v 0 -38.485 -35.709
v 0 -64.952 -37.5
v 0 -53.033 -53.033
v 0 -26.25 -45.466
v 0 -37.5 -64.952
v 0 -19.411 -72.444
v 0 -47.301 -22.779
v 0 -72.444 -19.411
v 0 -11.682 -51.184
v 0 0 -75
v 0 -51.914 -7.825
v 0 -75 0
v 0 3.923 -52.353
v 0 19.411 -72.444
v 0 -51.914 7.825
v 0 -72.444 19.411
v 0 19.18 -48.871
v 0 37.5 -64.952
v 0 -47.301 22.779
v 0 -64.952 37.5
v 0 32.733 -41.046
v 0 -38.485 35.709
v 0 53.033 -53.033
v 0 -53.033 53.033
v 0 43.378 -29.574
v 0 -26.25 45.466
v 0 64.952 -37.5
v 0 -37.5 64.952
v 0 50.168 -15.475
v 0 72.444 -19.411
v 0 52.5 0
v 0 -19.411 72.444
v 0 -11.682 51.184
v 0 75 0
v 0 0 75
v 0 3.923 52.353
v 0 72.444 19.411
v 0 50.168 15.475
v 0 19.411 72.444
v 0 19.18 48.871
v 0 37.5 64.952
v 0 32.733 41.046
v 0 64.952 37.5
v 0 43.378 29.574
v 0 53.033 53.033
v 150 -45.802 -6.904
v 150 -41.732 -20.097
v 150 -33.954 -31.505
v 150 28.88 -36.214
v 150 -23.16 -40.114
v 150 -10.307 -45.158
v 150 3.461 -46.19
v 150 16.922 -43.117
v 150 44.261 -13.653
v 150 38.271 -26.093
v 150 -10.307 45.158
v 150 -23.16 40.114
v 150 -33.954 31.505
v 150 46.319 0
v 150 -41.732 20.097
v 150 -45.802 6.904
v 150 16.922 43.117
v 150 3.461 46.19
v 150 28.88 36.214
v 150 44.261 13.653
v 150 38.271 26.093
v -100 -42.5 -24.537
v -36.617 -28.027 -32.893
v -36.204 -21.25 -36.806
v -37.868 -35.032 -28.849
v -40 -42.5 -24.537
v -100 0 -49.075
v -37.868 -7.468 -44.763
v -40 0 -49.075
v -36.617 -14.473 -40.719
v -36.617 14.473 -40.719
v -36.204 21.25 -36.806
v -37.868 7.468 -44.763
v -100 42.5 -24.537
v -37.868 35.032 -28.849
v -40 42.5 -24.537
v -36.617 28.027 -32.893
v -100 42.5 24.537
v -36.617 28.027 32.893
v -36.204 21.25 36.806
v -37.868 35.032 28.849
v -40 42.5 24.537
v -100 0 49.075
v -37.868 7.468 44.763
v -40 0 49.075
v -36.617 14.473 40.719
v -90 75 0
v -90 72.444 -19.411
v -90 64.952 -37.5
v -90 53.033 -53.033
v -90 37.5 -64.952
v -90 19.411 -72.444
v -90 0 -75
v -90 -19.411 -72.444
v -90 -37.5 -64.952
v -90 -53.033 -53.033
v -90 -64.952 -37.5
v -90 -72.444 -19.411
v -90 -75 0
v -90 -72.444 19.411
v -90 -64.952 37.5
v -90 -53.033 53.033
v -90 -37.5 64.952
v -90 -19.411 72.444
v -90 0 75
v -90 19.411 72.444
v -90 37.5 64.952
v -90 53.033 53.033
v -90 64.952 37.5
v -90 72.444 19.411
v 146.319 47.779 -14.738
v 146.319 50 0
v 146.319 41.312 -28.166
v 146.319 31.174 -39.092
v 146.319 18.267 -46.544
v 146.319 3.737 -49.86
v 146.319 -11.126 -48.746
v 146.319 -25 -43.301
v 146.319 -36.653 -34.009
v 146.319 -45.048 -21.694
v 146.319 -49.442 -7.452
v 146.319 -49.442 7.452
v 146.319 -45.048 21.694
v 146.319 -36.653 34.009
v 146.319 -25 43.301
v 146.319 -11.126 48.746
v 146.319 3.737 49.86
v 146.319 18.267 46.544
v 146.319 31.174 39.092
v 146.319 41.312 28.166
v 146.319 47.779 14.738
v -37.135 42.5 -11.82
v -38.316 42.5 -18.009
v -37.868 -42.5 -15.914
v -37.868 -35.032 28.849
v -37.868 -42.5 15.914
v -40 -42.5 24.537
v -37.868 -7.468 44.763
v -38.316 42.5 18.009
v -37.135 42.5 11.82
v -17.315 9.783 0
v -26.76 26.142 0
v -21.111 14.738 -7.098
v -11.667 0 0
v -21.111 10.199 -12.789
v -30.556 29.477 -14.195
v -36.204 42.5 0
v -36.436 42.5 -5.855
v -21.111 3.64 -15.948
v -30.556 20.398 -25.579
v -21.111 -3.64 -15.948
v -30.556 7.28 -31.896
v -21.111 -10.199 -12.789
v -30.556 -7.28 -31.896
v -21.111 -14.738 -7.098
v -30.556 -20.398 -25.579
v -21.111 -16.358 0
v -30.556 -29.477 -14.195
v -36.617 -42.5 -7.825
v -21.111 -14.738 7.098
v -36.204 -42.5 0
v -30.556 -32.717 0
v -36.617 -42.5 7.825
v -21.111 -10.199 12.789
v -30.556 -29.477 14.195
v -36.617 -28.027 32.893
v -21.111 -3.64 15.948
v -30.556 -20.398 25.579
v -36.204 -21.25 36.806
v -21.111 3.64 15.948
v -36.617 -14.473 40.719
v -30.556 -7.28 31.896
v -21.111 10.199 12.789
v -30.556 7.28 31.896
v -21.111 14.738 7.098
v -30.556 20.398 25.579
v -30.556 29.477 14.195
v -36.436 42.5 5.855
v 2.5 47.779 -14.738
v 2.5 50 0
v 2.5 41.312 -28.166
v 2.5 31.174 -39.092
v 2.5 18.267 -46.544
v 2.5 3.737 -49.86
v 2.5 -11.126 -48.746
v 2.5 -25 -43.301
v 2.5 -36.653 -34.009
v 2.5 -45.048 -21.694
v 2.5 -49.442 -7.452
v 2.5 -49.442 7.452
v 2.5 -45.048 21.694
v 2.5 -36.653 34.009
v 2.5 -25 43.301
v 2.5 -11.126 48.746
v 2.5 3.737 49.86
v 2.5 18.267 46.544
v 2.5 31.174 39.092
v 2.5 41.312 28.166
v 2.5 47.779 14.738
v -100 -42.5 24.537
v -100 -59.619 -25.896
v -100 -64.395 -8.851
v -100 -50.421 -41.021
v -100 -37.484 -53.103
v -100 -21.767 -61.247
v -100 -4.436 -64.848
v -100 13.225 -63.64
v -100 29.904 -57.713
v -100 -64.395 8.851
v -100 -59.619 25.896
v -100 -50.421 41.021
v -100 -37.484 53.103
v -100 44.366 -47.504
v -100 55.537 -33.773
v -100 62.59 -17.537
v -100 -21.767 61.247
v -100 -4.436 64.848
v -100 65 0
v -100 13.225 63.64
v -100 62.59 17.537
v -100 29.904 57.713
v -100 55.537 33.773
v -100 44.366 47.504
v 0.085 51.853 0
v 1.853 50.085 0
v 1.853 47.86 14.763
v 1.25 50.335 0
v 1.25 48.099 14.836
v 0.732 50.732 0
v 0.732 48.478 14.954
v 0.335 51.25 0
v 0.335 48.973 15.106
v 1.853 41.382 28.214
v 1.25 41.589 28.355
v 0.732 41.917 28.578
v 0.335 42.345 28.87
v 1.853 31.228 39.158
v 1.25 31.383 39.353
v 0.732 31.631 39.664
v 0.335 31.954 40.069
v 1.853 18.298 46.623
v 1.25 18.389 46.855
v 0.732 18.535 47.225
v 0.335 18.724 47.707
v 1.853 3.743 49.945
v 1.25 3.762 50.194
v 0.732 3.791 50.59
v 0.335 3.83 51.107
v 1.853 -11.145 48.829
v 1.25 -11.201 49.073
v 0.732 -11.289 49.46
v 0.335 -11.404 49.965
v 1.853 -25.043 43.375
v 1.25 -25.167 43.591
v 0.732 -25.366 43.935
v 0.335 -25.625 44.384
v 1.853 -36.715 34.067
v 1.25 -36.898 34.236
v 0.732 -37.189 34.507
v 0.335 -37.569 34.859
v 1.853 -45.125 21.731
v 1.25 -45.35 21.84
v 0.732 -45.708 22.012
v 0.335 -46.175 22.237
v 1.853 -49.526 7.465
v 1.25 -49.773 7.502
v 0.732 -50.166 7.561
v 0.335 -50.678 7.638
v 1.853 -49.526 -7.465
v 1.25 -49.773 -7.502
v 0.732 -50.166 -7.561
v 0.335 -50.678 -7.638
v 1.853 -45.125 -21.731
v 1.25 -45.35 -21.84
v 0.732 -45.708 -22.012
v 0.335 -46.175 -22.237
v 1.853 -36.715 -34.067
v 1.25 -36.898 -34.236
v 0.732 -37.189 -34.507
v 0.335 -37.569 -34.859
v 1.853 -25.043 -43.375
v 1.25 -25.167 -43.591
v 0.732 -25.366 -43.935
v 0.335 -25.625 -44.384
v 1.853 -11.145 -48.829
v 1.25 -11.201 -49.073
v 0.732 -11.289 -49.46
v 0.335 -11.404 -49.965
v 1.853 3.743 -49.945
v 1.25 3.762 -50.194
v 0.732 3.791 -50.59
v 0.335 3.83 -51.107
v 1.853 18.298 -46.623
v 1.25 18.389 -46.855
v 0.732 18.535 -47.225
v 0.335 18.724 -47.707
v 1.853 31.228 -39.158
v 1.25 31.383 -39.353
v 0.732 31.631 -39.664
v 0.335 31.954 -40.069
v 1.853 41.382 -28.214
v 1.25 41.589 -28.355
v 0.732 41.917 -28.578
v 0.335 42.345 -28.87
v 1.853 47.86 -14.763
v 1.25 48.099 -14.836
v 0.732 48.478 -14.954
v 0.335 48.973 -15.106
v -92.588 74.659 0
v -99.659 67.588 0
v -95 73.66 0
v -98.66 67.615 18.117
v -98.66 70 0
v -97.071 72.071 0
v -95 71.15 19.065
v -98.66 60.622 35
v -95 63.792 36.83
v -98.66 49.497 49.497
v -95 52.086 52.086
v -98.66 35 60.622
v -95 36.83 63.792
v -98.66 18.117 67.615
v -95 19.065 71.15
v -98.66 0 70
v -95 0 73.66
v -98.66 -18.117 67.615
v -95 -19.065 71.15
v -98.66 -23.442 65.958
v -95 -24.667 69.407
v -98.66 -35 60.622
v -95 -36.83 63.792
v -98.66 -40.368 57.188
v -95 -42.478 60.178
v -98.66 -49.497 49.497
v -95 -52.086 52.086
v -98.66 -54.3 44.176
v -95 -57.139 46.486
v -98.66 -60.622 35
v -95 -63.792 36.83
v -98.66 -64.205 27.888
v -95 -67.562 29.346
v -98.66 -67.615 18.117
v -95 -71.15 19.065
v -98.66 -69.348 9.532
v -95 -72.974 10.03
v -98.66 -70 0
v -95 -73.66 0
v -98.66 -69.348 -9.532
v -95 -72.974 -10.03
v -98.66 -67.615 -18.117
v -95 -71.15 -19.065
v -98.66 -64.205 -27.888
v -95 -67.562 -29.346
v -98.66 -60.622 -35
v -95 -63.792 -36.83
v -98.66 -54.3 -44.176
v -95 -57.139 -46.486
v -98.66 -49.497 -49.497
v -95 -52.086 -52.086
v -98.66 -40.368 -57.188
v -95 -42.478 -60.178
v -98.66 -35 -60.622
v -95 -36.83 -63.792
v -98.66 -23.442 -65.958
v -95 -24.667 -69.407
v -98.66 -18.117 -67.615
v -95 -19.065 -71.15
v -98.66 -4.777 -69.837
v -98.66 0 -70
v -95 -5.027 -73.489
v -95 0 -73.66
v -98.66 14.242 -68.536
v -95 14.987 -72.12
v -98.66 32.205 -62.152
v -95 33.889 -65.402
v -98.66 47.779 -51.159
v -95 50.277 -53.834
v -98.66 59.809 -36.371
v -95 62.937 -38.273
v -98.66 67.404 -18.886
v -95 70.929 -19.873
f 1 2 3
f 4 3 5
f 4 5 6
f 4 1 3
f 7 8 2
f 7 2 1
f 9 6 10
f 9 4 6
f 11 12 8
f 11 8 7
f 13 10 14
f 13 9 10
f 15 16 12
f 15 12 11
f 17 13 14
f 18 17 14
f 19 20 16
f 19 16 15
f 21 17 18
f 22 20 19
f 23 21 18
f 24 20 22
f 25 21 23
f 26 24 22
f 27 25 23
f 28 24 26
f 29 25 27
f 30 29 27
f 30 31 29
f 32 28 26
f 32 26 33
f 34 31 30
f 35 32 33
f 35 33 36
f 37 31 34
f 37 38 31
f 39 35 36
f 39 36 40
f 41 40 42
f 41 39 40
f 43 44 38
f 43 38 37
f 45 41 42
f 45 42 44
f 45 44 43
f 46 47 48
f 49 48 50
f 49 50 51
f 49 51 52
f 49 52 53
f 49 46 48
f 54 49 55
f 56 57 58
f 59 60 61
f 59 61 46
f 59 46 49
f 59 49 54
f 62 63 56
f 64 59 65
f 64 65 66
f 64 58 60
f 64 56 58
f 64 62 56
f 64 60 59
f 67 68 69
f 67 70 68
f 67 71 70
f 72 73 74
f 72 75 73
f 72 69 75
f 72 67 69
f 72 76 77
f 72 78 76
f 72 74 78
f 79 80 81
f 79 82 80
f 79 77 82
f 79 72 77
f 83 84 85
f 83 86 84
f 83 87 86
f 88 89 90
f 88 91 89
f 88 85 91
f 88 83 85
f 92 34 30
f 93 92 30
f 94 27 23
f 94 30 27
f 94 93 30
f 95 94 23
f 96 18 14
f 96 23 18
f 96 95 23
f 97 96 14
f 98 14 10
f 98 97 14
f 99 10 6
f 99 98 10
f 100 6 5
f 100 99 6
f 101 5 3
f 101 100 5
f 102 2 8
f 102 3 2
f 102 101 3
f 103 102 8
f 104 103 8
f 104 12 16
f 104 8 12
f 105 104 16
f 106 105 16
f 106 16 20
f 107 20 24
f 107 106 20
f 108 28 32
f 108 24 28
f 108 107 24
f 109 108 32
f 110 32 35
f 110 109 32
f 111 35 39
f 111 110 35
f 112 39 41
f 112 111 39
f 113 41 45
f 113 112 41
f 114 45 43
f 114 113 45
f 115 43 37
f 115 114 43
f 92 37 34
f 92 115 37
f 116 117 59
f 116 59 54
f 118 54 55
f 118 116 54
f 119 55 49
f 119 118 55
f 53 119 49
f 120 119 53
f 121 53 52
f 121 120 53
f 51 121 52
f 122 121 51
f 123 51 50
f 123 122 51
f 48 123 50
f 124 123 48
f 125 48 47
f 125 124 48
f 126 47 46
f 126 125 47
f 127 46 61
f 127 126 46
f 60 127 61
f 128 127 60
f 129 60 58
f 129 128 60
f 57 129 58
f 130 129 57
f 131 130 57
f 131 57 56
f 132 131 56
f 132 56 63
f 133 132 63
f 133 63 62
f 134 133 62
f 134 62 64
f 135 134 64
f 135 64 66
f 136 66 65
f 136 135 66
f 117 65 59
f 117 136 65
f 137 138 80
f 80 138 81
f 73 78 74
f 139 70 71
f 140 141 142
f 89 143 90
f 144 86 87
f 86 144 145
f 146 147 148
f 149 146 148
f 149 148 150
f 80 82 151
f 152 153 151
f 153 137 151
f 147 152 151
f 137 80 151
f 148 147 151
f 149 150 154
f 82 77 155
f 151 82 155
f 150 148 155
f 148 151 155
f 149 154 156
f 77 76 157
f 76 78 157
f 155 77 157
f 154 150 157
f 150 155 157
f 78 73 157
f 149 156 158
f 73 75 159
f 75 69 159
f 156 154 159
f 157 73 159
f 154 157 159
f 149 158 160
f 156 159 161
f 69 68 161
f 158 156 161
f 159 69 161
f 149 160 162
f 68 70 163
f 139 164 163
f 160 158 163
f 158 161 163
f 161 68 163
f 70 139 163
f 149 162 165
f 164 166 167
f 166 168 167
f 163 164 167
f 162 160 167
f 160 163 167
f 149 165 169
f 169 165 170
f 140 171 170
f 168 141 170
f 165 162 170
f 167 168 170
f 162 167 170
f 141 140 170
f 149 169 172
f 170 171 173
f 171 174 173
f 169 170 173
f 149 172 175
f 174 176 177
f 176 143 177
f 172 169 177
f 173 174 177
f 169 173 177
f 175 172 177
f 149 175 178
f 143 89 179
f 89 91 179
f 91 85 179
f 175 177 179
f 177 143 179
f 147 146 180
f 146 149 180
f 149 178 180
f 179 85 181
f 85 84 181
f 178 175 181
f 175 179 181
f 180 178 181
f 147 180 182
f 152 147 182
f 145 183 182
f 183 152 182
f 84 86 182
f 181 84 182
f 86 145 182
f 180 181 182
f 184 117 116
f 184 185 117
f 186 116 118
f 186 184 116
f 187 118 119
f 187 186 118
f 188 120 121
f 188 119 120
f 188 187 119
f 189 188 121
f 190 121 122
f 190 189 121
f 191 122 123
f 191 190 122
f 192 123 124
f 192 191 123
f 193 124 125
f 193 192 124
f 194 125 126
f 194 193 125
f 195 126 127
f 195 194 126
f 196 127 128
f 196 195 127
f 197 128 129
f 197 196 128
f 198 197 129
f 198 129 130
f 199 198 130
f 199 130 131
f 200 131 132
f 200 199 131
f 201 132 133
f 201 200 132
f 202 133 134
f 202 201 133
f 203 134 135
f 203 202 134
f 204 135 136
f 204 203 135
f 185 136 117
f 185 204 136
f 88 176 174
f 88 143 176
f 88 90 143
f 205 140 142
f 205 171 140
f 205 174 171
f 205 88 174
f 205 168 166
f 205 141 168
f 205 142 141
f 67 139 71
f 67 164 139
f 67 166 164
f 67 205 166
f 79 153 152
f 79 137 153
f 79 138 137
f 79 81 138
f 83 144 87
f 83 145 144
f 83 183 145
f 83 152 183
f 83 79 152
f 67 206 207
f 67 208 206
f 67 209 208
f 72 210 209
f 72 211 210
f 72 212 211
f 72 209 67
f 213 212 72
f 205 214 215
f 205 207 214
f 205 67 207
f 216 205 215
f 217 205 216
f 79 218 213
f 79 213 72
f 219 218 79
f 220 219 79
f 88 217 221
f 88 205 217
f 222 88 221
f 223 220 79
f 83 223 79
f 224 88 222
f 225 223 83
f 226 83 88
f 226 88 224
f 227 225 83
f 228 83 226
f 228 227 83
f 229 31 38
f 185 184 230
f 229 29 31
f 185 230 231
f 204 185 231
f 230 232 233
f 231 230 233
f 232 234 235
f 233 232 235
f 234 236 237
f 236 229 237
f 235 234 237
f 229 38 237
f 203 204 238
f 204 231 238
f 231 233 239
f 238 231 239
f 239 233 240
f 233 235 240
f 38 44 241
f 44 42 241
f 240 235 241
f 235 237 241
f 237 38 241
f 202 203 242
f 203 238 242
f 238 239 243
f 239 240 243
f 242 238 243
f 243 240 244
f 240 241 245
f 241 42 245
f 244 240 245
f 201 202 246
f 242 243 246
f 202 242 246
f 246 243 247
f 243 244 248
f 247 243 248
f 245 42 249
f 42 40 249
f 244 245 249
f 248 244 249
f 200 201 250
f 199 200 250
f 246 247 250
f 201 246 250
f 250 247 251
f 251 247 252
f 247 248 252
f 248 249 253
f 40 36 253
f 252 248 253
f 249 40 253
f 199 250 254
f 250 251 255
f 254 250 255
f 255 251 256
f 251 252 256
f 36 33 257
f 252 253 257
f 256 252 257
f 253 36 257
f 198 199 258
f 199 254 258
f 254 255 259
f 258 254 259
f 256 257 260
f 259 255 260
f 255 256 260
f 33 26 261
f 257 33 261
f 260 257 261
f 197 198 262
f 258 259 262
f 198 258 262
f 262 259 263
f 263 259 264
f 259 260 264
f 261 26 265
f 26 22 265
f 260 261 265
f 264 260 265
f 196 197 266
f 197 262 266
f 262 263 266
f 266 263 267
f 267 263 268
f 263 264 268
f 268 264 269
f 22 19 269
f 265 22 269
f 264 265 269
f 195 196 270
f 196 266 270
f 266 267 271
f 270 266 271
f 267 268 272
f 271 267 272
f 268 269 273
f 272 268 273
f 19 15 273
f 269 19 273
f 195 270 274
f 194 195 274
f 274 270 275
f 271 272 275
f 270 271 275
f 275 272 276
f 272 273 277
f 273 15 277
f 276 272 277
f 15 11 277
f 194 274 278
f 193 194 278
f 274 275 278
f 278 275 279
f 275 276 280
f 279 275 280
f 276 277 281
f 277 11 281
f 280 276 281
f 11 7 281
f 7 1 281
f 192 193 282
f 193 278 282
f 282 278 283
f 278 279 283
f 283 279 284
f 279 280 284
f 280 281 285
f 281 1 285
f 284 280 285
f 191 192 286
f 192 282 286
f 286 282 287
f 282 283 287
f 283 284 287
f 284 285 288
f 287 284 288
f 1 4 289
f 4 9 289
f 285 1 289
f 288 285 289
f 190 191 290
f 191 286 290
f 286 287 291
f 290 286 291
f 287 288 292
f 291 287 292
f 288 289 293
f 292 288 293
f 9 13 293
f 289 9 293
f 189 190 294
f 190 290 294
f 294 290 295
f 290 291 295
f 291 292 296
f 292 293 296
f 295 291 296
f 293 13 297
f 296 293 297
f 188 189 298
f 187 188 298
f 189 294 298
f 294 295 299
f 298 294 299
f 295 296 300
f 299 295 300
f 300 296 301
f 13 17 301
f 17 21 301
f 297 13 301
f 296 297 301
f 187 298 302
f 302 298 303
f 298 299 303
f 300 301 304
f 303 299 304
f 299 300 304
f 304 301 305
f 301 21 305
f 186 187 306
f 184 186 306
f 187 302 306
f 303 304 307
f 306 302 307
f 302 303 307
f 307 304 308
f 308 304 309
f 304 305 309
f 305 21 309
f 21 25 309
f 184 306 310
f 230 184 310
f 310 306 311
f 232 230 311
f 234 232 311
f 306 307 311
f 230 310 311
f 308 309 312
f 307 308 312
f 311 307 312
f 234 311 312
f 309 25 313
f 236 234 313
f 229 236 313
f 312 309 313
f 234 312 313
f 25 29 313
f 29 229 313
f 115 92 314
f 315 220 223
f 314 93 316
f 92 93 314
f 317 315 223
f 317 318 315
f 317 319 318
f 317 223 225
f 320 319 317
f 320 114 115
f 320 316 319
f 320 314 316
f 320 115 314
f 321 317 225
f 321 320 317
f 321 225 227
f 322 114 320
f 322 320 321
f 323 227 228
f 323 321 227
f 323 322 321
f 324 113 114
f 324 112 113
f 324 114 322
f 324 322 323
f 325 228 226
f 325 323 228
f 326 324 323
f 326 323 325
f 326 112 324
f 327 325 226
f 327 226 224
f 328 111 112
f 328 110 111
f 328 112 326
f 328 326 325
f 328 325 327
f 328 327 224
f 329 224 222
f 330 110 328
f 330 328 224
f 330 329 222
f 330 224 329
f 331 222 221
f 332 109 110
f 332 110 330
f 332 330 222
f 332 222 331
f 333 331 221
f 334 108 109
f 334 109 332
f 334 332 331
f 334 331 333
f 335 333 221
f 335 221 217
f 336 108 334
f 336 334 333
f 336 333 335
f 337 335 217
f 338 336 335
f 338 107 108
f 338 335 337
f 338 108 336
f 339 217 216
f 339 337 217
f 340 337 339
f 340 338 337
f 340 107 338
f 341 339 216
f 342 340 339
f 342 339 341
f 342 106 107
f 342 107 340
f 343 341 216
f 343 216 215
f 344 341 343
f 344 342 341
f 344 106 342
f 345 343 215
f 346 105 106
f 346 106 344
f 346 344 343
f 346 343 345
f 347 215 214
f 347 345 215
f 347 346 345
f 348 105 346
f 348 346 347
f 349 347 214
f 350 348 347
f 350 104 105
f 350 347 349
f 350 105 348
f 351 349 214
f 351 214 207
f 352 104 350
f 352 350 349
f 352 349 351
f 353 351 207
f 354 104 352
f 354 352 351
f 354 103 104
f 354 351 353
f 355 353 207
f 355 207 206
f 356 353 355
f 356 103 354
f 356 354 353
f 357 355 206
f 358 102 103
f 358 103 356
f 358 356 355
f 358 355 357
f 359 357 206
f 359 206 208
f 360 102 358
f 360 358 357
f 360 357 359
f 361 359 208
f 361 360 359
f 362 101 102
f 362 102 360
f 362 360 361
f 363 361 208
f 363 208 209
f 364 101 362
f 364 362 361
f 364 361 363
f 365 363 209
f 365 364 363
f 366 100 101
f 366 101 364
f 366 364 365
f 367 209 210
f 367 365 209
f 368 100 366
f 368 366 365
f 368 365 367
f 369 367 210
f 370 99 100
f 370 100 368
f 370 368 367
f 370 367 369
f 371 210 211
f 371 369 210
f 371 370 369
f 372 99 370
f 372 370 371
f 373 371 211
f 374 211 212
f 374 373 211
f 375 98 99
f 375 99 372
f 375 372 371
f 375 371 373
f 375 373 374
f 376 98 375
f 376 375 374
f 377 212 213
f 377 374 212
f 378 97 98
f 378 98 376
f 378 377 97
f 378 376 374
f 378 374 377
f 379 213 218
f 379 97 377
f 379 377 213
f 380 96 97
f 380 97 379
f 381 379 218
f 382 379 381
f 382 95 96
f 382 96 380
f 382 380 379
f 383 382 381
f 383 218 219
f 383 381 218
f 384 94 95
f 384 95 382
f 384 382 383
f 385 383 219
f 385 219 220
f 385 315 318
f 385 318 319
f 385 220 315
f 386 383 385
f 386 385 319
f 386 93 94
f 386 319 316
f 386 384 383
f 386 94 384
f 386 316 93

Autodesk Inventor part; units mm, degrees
ref_plane "YZ Plane" through (0, 0, 0) normal (1, 0, 0) x (0, 1, 0)
ref_plane "XZ Plane" through (0, 0, 0) normal (0, 1, 0) x (-1, 0, 0)
sketch "Skizze1" plane through (0, 0, 0) normal (0, 0, 1) x (1, 0, 0)
  line L0 (-11.6667, 0) -> (150, 0)
  line L1 (150, 0) -> (150, 50)
  line L2 (150, 50) -> (15, 50)
  line L3 (15, 50) -> (11.3192, 50)
  line L4 (11.3192, 50) -> (0, 50)
  line L5 (0, 50) -> (0, 75)
  line L6 (0, 75) -> (-100, 75)
  line L7 (-100, 75) -> (-100, 49.0748)
  line L8 (-100, 49.0748) -> (-40, 49.0748)
  line L9 (-40, 49.0748) -> (-11.6667, 0)
  line L10 (-150, 0) -> (200, 0) projected
  line L11 (0, -15) -> (0, 90) projected
  line L12 (15, 50) -> (0, 50) construction
  dimension "d1" = 135
  dimension "d2" = 3.6808
  dimension "d3" = 100
  dimension "d4" = 60
  dimension "d5" = 60
  dimension "d6" = 100
  dimension "d7" = 100
  dimension "d8" = 98.1496
  dimension "d9" = 150
  dimension "d26" = 150
revolve "Körper" add sketch "Skizze1" angle 360 about axis through (-11.6667, 0, 0) along (1, 0, 0)
sketch "Skizze2" plane through (-100, 0, 0) normal (-1, 0, 0) x (0, 0, 1)
  circle A0 centre (0, 0) radius 49.0748 projected
  line L0 (0, -105) -> (0, 105) projected
  line L1 (-105, 0) -> (105, 0) projected
  line L2 (49.0748, 0) -> (24.5374, -42.5)
  line L3 (24.5374, -42.5) -> (-24.5374, -42.5)
  line L4 (-24.5374, -42.5) -> (-49.0748, 0)
  line L5 (-49.0748, 0) -> (-24.5374, 42.5)
  line L6 (-24.5374, 42.5) -> (24.5374, 42.5)
  line L7 (24.5374, 42.5) -> (49.0748, 0)
extrude "Loch" add sketch "Skizze2" against normal up to next contours L7 A0 | A0 L2 | L6 L0 A0 | A0 L0 L3 | L0 L6 A0 | A0 L3 L0 | L4 A0 | A0 L5
fillet "Rundung1" radius 10 1 edges at (-100, -75, 0)
thread "Gewinde" size "M100x6" class "6g" standard "ISO Metric profile" length 135
chamfer "Fase1" distance 3.6807 distance2 3.6807 1 edges at (150, -50, 0) measured on face at (150, -3.2515, 16.3464)
ref_plane "Work Plane1" through (29, 0, 0) normal (0, -1, 0) x (1, 0, 0)
fillet "Fillet2" radius 2.5 1 edges at (0, -50, 0)
equation "\"d1\" = GEL"
equation "\"d3\" = KOH"
equation "\"d4\" = INTI"
equation "\"d6\" = GD"
equation "\"d7\" = BDM"
equation "\"d8\" = 1.1547 * SW"
equation "\"d9\" = KOD"
equation "\"d26\" = NLG"
equation "\"d30\" = R"
equation "\"d17\" = RR"
equation "\"d13\" = GEL"
equation "\"d15\" = -0.5 * SPD + 0.5 * GD"
equation "\"d16\" = GUL"
equation "\"GD\" = NND"
equation "\"NLG\" = 150"
equation "\"GEL\" = 135"
equation "\"KOD\" = 150"
equation "\"KOH\" = 100"
equation "\"INTI\" = 60"
equation "\"GAL\" = 0.61345 * PTC"
equation "\"GUL\" = 0.61345 * PTC"
equation "\"BDM\" = NND"
equation "\"SW\" = 85"
equation "\"SPD\" = NND - 1.2269 * PTC"
equation "\"R\" = 2.5"
equation "\"TOA\" = 30deg"
equation "\"GD1\" = THREADDIA - 1.2269 * PTC"
equation "\"FAWI\" = 45deg"
equation "\"ANG\" = 120deg"
equation "\"PTC\" = 6"
equation "\"E0\" = 1.155 * SW"
equation "\"RR\" = 10"
equation "\"NND\" = 100"
equation "\"THREADDIA\" = 100"
properties part number "DIN 912 - M100 x 6 x 150" material "Stahl, weich"
